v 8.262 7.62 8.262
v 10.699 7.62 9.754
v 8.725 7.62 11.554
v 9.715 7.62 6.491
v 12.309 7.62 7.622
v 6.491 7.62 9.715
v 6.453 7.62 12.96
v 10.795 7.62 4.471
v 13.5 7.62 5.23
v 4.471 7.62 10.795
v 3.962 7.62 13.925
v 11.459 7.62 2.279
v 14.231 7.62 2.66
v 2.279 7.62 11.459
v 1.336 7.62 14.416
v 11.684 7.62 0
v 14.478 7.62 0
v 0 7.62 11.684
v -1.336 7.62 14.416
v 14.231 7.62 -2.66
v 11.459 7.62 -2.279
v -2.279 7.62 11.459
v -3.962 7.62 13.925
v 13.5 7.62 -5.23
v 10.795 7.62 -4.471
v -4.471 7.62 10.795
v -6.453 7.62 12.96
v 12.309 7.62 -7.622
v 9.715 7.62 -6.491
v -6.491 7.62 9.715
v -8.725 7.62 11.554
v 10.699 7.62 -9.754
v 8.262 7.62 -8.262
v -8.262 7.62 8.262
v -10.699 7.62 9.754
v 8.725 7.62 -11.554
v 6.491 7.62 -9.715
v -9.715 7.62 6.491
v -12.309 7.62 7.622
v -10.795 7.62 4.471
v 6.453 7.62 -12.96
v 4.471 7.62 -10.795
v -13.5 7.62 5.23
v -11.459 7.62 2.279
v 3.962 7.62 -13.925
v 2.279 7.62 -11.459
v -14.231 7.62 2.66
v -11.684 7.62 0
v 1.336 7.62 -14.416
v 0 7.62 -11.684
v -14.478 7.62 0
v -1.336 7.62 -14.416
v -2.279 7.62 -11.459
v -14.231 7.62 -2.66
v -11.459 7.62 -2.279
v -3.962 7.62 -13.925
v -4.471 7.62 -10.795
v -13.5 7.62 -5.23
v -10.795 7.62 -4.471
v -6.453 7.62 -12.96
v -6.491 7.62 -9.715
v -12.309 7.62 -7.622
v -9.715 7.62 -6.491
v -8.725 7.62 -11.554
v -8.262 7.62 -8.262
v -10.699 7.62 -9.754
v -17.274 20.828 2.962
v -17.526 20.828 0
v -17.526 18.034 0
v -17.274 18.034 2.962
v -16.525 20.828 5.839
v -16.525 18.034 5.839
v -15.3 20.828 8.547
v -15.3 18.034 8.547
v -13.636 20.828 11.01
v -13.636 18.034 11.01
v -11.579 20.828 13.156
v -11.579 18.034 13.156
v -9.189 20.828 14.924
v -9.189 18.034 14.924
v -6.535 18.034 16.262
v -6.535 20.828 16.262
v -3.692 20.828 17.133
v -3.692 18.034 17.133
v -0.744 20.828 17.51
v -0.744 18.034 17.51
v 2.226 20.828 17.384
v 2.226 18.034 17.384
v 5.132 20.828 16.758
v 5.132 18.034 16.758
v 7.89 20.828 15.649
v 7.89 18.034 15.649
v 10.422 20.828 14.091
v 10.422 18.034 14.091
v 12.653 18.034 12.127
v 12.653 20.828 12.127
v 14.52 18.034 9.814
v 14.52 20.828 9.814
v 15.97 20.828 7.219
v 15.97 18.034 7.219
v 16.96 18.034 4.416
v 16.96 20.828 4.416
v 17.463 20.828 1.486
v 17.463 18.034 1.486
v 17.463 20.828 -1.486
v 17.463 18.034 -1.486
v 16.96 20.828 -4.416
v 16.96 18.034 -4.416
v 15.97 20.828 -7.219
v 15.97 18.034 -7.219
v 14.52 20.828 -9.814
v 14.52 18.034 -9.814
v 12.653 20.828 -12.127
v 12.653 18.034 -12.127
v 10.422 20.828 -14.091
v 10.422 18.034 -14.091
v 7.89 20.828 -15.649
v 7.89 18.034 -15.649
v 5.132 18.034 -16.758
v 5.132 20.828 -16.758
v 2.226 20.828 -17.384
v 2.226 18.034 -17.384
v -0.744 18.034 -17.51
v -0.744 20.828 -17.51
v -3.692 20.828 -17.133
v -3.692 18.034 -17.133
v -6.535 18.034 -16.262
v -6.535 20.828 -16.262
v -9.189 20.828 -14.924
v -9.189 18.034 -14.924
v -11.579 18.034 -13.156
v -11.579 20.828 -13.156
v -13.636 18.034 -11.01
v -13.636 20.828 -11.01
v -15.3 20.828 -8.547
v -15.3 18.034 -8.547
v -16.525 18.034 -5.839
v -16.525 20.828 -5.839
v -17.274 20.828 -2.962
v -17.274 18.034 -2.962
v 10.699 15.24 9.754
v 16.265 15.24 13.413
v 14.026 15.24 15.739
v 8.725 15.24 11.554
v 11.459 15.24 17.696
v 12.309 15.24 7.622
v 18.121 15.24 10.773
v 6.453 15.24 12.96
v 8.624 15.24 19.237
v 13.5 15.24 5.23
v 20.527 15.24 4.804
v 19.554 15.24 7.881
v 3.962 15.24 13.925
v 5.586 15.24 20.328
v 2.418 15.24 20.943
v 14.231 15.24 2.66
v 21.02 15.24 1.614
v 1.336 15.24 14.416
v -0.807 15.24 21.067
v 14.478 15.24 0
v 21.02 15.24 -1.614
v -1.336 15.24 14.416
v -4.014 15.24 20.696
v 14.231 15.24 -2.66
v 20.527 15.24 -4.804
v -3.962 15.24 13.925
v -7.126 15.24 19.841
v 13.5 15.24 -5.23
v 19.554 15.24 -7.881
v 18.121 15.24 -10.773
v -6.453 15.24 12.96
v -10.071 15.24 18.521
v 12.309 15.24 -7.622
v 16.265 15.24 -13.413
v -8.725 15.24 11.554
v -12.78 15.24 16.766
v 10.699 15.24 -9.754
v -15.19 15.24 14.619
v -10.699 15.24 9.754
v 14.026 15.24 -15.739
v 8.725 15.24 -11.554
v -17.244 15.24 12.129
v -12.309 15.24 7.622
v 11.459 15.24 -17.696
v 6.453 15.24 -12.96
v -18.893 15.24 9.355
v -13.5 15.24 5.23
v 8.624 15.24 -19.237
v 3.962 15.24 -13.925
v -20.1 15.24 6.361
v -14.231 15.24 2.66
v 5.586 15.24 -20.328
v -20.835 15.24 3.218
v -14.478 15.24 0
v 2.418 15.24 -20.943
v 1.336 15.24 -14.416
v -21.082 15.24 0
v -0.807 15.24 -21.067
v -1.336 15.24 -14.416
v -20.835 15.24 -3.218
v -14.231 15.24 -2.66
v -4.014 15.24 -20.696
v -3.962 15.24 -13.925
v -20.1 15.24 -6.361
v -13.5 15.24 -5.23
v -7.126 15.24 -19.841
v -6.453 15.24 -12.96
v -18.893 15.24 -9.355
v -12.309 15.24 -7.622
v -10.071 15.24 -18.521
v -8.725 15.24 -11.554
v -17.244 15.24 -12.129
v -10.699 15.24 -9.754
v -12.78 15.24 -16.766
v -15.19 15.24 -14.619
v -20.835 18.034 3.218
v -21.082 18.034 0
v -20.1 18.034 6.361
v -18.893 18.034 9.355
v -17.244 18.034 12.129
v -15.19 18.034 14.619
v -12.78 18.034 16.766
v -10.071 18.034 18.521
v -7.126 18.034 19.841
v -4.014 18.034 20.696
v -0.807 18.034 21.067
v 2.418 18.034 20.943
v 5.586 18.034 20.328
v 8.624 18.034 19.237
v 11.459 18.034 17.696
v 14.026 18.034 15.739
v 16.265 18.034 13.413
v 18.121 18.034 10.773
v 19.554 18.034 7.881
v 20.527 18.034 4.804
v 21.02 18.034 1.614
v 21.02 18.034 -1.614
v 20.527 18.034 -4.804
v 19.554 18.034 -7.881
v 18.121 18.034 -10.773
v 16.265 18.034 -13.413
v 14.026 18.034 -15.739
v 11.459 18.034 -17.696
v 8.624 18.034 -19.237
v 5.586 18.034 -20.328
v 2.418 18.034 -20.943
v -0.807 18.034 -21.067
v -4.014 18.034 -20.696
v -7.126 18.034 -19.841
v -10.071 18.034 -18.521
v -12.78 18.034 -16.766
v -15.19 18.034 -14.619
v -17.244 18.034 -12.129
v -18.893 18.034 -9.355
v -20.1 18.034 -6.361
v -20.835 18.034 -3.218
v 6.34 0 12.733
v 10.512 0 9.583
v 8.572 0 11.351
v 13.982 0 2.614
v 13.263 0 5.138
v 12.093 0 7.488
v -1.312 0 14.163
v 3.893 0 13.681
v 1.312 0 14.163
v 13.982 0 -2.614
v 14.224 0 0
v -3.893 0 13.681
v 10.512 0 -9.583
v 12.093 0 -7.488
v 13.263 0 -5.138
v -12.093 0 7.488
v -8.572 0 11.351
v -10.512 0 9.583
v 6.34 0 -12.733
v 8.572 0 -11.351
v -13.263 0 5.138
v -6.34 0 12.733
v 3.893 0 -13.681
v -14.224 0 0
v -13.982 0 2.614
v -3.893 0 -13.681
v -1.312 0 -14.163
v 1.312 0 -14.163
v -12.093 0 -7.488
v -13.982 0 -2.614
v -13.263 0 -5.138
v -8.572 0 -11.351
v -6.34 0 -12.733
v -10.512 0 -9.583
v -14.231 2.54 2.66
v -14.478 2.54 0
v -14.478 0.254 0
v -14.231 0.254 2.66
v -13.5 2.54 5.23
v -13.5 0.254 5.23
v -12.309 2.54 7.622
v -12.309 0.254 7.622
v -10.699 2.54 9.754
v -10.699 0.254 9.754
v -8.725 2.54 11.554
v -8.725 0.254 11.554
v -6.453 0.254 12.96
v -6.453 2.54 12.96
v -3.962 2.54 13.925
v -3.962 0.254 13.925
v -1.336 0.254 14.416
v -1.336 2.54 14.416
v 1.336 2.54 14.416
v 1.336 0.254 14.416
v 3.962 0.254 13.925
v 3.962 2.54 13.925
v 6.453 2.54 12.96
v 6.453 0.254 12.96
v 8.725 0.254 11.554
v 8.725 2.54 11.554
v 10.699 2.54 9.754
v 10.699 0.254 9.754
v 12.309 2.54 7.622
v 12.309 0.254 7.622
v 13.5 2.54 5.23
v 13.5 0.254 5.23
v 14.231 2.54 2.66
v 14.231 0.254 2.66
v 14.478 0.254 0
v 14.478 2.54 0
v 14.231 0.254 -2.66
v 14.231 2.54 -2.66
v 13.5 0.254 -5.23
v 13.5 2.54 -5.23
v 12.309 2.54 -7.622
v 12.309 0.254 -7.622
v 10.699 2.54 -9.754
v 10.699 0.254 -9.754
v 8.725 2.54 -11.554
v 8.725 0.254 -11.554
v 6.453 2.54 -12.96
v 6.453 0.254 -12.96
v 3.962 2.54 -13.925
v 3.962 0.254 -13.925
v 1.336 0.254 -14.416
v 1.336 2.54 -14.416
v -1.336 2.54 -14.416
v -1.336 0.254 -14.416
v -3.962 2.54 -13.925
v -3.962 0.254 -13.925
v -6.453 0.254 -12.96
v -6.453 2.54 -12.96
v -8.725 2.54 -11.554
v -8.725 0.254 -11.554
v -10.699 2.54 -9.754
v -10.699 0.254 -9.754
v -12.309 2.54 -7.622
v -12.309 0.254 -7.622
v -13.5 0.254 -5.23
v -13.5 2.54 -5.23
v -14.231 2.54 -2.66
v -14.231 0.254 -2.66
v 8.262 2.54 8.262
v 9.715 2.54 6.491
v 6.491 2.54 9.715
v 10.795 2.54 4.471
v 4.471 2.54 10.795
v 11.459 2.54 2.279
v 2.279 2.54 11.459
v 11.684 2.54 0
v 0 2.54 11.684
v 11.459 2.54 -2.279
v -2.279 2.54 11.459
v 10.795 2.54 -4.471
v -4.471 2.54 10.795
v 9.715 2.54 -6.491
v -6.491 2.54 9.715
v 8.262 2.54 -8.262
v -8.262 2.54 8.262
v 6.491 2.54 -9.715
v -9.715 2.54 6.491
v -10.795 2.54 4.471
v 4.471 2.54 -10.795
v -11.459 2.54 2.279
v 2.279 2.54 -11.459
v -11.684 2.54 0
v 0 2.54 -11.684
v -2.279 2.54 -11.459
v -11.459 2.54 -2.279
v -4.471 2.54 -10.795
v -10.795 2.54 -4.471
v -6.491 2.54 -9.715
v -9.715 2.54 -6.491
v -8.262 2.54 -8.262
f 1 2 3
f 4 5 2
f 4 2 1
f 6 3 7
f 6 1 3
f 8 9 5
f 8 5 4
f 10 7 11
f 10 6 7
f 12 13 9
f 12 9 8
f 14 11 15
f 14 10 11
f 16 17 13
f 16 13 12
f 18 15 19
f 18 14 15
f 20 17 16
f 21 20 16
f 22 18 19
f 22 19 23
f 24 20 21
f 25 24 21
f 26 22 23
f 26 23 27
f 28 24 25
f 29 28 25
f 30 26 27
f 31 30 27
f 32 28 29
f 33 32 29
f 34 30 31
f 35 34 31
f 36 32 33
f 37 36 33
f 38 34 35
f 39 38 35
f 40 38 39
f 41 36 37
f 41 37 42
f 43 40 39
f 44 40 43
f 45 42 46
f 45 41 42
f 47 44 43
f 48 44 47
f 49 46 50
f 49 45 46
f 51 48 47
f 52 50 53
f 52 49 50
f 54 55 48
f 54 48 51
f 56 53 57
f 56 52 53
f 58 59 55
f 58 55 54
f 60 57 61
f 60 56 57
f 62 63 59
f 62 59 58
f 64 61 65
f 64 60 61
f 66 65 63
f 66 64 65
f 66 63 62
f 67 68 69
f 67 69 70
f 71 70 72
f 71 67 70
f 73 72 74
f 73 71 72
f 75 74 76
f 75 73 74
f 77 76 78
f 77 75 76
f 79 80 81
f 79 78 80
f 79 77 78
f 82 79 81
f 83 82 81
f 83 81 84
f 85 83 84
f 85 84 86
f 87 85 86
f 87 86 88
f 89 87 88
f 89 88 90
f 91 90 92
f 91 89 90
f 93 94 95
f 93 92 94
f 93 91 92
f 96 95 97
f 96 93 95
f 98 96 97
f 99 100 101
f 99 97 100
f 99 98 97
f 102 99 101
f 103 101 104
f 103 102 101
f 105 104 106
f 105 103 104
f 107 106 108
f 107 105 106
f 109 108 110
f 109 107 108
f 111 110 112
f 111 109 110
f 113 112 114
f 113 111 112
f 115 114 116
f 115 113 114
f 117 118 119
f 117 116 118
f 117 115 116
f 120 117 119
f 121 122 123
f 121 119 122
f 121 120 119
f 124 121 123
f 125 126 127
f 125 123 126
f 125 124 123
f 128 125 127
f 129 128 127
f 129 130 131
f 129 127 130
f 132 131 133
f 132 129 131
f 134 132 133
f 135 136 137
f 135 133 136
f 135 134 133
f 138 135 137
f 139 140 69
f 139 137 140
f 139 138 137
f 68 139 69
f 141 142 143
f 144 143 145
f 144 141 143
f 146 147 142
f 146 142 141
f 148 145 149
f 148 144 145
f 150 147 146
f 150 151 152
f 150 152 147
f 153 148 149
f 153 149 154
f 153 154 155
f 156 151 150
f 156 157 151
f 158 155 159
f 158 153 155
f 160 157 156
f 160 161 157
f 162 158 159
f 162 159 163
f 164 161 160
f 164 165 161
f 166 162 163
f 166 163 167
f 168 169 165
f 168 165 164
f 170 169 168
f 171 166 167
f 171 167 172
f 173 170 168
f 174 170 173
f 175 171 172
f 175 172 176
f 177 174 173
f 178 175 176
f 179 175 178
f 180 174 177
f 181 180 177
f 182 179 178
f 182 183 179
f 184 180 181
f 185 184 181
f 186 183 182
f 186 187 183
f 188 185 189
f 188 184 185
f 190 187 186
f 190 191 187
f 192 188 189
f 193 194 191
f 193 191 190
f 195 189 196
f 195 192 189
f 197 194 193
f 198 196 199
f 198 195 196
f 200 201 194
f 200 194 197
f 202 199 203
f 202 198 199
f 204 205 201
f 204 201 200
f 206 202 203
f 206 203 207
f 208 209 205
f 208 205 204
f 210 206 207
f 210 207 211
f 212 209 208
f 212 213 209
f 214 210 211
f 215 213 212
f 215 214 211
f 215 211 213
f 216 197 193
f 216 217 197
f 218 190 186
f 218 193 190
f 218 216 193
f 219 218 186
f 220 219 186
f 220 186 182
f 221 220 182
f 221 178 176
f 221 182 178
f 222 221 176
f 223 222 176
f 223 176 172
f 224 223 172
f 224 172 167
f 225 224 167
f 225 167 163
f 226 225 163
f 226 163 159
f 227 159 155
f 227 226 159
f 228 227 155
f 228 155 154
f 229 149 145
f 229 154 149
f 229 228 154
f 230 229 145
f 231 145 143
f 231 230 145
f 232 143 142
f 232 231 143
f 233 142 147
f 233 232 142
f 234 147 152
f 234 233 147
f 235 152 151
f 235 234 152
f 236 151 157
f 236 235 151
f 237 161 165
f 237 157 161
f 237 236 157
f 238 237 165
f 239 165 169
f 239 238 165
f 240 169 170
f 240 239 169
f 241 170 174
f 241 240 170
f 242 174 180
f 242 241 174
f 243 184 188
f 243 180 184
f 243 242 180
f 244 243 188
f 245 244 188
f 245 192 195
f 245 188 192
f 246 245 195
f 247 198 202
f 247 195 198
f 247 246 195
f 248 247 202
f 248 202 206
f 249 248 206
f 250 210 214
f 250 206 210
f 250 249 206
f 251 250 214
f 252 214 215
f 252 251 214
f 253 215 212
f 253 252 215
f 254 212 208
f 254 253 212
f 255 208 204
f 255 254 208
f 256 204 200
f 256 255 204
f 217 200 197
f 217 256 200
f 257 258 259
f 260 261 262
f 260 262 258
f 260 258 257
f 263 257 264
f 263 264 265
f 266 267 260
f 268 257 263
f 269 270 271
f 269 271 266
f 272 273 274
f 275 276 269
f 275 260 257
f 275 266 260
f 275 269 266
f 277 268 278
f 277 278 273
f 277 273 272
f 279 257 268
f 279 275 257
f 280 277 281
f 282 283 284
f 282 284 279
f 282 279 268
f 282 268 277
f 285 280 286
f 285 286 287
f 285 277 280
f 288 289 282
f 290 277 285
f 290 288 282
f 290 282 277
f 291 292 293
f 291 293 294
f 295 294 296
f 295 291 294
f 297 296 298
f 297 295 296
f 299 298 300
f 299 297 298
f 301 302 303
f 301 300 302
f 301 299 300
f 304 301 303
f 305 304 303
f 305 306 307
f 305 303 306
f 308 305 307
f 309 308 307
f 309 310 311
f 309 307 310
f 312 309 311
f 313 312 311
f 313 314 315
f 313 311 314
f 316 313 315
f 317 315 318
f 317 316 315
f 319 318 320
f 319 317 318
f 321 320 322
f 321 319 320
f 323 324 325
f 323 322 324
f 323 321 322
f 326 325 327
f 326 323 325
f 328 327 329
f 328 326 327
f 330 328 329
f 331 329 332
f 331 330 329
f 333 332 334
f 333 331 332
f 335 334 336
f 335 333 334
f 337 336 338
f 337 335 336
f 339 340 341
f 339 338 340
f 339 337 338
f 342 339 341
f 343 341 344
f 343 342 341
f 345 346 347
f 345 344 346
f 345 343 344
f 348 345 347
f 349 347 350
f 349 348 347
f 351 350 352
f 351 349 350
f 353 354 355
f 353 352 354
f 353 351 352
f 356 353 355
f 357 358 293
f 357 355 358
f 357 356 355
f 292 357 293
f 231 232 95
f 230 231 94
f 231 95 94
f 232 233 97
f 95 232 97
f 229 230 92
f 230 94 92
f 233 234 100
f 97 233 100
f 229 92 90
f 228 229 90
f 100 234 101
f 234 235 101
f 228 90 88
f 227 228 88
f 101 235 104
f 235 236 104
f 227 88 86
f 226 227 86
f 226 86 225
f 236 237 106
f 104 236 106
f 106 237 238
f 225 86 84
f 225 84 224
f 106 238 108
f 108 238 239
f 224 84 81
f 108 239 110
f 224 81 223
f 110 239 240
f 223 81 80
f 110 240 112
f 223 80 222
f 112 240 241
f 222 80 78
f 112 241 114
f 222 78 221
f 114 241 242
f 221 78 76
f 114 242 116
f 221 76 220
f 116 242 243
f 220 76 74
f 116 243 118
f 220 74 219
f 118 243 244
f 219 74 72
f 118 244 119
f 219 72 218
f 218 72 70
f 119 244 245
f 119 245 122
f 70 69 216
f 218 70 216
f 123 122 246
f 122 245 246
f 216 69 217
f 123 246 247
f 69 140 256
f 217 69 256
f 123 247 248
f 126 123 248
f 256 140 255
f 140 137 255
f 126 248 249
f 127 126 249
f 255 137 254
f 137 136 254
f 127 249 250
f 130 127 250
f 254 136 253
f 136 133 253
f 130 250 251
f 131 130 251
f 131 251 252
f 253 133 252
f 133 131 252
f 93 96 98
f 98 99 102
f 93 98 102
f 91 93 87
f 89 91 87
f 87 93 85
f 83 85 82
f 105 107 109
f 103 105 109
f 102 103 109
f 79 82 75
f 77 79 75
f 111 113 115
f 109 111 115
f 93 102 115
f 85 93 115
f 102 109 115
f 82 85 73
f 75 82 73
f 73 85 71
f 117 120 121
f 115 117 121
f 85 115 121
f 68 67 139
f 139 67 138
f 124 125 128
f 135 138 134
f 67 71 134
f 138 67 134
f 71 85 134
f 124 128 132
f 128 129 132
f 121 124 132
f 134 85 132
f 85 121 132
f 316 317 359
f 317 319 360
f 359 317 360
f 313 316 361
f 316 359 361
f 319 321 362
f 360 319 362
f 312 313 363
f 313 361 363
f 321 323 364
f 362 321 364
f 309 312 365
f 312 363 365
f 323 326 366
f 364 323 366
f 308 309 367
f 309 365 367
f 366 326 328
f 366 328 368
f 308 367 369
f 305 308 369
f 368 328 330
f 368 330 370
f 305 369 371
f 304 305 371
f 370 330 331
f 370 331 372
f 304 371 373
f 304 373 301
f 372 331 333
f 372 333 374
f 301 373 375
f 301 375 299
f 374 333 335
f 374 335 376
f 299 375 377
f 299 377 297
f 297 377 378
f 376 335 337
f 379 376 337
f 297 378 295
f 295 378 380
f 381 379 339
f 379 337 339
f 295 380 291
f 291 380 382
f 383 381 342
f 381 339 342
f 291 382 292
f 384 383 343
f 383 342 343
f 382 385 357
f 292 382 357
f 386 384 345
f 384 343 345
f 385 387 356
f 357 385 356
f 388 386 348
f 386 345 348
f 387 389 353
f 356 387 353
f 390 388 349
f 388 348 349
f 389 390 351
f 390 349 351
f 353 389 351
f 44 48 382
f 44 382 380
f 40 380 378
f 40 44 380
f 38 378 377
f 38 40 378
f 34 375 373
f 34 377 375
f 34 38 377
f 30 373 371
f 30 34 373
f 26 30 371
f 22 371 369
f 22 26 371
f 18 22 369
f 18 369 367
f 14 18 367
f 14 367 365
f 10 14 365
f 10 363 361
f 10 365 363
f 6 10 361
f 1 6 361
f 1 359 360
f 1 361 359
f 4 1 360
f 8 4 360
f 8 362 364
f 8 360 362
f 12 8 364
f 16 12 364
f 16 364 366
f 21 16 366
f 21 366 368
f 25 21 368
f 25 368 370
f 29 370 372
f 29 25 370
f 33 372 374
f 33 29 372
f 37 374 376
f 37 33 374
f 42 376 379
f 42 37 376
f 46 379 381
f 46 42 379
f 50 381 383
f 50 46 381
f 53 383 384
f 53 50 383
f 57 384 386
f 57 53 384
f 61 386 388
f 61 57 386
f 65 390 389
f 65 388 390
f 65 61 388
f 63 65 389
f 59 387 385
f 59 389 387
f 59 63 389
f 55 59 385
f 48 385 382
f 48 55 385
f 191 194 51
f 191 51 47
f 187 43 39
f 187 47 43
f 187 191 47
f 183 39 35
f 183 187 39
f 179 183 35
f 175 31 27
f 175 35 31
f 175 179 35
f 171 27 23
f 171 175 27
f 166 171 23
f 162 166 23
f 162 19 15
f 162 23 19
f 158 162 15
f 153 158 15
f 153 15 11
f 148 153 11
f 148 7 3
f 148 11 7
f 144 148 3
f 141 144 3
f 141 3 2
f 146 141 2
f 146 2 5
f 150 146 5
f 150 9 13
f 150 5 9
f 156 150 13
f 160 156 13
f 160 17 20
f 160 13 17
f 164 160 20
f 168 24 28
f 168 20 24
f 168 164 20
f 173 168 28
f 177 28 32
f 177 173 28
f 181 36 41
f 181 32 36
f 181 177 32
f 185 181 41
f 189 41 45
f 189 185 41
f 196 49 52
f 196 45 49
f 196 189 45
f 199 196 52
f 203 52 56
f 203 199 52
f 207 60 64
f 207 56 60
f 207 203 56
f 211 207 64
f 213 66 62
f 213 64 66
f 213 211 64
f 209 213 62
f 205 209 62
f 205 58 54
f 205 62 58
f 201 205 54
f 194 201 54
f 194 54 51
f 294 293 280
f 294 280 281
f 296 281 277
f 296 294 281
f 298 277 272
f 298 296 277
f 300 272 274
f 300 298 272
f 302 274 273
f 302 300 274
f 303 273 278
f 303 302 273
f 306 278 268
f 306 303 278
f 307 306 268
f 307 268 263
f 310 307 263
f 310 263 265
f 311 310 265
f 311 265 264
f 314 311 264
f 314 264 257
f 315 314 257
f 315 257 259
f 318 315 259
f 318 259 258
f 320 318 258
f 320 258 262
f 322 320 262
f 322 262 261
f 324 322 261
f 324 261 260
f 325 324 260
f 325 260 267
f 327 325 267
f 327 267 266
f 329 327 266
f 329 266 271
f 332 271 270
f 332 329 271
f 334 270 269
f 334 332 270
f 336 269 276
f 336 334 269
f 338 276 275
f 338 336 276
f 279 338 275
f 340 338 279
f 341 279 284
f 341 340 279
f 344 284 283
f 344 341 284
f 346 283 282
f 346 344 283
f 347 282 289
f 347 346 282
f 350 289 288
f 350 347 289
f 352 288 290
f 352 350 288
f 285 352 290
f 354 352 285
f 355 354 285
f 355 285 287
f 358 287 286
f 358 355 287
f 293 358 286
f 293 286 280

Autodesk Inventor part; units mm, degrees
ref_plane "YZ Plane" through (0, 0, 0) normal (1, 0, 0) x (0, 1, 0)
ref_plane "XZ Plane" through (0, 0, 0) normal (0, 1, 0) x (-1, 0, 0)
ref_plane "XY Plane" through (0, 0, 0) normal (0, 0, 1) x (1, 0, 0)
sketch "Sketch1" plane through (0, 0, 0) normal (0, 0, 1) x (1, 0, 0)
  line L0 (0, 0) -> (-14.478, 0)
  line L1 (-14.478, 0) -> (-14.478, 2.54)
  line L2 (-14.478, 2.54) -> (-11.684, 2.54)
  line L3 (-11.684, 2.54) -> (-11.684, 7.62)
  line L4 (-11.684, 7.62) -> (-14.478, 7.62)
  line L5 (-14.478, 7.62) -> (-14.478, 15.24)
  line L6 (-14.478, 15.24) -> (-21.082, 15.24)
  line L7 (-21.082, 15.24) -> (-21.082, 18.034)
  line L8 (-21.082, 18.034) -> (-17.526, 18.034)
  line L9 (-17.526, 18.034) -> (-17.526, 20.828)
  line L10 (-17.526, 20.828) -> (0, 20.828)
  line L11 (0, 20.828) -> (0, 0)
  dimension "d0" = 17.526
  dimension "d1" = 21.082
  dimension "d2" = 14.478
  dimension "d3" = 11.684
  dimension "d4" = 2.794
  dimension "d5" = 5.588
  dimension "d7" = 18.288
  dimension "d8" = 13.208
  dimension "d9" = 20.828
revolve "Revolution1" add sketch "Sketch1" angle 360 about axis through (0, 20.828, 0) along (0, -1, 0)
chamfer "Chamfer1" distance 0.254 angle 45 1 edges at (14.478, 0, 0)
properties part number "GL45 bottle cap insert; solid"
